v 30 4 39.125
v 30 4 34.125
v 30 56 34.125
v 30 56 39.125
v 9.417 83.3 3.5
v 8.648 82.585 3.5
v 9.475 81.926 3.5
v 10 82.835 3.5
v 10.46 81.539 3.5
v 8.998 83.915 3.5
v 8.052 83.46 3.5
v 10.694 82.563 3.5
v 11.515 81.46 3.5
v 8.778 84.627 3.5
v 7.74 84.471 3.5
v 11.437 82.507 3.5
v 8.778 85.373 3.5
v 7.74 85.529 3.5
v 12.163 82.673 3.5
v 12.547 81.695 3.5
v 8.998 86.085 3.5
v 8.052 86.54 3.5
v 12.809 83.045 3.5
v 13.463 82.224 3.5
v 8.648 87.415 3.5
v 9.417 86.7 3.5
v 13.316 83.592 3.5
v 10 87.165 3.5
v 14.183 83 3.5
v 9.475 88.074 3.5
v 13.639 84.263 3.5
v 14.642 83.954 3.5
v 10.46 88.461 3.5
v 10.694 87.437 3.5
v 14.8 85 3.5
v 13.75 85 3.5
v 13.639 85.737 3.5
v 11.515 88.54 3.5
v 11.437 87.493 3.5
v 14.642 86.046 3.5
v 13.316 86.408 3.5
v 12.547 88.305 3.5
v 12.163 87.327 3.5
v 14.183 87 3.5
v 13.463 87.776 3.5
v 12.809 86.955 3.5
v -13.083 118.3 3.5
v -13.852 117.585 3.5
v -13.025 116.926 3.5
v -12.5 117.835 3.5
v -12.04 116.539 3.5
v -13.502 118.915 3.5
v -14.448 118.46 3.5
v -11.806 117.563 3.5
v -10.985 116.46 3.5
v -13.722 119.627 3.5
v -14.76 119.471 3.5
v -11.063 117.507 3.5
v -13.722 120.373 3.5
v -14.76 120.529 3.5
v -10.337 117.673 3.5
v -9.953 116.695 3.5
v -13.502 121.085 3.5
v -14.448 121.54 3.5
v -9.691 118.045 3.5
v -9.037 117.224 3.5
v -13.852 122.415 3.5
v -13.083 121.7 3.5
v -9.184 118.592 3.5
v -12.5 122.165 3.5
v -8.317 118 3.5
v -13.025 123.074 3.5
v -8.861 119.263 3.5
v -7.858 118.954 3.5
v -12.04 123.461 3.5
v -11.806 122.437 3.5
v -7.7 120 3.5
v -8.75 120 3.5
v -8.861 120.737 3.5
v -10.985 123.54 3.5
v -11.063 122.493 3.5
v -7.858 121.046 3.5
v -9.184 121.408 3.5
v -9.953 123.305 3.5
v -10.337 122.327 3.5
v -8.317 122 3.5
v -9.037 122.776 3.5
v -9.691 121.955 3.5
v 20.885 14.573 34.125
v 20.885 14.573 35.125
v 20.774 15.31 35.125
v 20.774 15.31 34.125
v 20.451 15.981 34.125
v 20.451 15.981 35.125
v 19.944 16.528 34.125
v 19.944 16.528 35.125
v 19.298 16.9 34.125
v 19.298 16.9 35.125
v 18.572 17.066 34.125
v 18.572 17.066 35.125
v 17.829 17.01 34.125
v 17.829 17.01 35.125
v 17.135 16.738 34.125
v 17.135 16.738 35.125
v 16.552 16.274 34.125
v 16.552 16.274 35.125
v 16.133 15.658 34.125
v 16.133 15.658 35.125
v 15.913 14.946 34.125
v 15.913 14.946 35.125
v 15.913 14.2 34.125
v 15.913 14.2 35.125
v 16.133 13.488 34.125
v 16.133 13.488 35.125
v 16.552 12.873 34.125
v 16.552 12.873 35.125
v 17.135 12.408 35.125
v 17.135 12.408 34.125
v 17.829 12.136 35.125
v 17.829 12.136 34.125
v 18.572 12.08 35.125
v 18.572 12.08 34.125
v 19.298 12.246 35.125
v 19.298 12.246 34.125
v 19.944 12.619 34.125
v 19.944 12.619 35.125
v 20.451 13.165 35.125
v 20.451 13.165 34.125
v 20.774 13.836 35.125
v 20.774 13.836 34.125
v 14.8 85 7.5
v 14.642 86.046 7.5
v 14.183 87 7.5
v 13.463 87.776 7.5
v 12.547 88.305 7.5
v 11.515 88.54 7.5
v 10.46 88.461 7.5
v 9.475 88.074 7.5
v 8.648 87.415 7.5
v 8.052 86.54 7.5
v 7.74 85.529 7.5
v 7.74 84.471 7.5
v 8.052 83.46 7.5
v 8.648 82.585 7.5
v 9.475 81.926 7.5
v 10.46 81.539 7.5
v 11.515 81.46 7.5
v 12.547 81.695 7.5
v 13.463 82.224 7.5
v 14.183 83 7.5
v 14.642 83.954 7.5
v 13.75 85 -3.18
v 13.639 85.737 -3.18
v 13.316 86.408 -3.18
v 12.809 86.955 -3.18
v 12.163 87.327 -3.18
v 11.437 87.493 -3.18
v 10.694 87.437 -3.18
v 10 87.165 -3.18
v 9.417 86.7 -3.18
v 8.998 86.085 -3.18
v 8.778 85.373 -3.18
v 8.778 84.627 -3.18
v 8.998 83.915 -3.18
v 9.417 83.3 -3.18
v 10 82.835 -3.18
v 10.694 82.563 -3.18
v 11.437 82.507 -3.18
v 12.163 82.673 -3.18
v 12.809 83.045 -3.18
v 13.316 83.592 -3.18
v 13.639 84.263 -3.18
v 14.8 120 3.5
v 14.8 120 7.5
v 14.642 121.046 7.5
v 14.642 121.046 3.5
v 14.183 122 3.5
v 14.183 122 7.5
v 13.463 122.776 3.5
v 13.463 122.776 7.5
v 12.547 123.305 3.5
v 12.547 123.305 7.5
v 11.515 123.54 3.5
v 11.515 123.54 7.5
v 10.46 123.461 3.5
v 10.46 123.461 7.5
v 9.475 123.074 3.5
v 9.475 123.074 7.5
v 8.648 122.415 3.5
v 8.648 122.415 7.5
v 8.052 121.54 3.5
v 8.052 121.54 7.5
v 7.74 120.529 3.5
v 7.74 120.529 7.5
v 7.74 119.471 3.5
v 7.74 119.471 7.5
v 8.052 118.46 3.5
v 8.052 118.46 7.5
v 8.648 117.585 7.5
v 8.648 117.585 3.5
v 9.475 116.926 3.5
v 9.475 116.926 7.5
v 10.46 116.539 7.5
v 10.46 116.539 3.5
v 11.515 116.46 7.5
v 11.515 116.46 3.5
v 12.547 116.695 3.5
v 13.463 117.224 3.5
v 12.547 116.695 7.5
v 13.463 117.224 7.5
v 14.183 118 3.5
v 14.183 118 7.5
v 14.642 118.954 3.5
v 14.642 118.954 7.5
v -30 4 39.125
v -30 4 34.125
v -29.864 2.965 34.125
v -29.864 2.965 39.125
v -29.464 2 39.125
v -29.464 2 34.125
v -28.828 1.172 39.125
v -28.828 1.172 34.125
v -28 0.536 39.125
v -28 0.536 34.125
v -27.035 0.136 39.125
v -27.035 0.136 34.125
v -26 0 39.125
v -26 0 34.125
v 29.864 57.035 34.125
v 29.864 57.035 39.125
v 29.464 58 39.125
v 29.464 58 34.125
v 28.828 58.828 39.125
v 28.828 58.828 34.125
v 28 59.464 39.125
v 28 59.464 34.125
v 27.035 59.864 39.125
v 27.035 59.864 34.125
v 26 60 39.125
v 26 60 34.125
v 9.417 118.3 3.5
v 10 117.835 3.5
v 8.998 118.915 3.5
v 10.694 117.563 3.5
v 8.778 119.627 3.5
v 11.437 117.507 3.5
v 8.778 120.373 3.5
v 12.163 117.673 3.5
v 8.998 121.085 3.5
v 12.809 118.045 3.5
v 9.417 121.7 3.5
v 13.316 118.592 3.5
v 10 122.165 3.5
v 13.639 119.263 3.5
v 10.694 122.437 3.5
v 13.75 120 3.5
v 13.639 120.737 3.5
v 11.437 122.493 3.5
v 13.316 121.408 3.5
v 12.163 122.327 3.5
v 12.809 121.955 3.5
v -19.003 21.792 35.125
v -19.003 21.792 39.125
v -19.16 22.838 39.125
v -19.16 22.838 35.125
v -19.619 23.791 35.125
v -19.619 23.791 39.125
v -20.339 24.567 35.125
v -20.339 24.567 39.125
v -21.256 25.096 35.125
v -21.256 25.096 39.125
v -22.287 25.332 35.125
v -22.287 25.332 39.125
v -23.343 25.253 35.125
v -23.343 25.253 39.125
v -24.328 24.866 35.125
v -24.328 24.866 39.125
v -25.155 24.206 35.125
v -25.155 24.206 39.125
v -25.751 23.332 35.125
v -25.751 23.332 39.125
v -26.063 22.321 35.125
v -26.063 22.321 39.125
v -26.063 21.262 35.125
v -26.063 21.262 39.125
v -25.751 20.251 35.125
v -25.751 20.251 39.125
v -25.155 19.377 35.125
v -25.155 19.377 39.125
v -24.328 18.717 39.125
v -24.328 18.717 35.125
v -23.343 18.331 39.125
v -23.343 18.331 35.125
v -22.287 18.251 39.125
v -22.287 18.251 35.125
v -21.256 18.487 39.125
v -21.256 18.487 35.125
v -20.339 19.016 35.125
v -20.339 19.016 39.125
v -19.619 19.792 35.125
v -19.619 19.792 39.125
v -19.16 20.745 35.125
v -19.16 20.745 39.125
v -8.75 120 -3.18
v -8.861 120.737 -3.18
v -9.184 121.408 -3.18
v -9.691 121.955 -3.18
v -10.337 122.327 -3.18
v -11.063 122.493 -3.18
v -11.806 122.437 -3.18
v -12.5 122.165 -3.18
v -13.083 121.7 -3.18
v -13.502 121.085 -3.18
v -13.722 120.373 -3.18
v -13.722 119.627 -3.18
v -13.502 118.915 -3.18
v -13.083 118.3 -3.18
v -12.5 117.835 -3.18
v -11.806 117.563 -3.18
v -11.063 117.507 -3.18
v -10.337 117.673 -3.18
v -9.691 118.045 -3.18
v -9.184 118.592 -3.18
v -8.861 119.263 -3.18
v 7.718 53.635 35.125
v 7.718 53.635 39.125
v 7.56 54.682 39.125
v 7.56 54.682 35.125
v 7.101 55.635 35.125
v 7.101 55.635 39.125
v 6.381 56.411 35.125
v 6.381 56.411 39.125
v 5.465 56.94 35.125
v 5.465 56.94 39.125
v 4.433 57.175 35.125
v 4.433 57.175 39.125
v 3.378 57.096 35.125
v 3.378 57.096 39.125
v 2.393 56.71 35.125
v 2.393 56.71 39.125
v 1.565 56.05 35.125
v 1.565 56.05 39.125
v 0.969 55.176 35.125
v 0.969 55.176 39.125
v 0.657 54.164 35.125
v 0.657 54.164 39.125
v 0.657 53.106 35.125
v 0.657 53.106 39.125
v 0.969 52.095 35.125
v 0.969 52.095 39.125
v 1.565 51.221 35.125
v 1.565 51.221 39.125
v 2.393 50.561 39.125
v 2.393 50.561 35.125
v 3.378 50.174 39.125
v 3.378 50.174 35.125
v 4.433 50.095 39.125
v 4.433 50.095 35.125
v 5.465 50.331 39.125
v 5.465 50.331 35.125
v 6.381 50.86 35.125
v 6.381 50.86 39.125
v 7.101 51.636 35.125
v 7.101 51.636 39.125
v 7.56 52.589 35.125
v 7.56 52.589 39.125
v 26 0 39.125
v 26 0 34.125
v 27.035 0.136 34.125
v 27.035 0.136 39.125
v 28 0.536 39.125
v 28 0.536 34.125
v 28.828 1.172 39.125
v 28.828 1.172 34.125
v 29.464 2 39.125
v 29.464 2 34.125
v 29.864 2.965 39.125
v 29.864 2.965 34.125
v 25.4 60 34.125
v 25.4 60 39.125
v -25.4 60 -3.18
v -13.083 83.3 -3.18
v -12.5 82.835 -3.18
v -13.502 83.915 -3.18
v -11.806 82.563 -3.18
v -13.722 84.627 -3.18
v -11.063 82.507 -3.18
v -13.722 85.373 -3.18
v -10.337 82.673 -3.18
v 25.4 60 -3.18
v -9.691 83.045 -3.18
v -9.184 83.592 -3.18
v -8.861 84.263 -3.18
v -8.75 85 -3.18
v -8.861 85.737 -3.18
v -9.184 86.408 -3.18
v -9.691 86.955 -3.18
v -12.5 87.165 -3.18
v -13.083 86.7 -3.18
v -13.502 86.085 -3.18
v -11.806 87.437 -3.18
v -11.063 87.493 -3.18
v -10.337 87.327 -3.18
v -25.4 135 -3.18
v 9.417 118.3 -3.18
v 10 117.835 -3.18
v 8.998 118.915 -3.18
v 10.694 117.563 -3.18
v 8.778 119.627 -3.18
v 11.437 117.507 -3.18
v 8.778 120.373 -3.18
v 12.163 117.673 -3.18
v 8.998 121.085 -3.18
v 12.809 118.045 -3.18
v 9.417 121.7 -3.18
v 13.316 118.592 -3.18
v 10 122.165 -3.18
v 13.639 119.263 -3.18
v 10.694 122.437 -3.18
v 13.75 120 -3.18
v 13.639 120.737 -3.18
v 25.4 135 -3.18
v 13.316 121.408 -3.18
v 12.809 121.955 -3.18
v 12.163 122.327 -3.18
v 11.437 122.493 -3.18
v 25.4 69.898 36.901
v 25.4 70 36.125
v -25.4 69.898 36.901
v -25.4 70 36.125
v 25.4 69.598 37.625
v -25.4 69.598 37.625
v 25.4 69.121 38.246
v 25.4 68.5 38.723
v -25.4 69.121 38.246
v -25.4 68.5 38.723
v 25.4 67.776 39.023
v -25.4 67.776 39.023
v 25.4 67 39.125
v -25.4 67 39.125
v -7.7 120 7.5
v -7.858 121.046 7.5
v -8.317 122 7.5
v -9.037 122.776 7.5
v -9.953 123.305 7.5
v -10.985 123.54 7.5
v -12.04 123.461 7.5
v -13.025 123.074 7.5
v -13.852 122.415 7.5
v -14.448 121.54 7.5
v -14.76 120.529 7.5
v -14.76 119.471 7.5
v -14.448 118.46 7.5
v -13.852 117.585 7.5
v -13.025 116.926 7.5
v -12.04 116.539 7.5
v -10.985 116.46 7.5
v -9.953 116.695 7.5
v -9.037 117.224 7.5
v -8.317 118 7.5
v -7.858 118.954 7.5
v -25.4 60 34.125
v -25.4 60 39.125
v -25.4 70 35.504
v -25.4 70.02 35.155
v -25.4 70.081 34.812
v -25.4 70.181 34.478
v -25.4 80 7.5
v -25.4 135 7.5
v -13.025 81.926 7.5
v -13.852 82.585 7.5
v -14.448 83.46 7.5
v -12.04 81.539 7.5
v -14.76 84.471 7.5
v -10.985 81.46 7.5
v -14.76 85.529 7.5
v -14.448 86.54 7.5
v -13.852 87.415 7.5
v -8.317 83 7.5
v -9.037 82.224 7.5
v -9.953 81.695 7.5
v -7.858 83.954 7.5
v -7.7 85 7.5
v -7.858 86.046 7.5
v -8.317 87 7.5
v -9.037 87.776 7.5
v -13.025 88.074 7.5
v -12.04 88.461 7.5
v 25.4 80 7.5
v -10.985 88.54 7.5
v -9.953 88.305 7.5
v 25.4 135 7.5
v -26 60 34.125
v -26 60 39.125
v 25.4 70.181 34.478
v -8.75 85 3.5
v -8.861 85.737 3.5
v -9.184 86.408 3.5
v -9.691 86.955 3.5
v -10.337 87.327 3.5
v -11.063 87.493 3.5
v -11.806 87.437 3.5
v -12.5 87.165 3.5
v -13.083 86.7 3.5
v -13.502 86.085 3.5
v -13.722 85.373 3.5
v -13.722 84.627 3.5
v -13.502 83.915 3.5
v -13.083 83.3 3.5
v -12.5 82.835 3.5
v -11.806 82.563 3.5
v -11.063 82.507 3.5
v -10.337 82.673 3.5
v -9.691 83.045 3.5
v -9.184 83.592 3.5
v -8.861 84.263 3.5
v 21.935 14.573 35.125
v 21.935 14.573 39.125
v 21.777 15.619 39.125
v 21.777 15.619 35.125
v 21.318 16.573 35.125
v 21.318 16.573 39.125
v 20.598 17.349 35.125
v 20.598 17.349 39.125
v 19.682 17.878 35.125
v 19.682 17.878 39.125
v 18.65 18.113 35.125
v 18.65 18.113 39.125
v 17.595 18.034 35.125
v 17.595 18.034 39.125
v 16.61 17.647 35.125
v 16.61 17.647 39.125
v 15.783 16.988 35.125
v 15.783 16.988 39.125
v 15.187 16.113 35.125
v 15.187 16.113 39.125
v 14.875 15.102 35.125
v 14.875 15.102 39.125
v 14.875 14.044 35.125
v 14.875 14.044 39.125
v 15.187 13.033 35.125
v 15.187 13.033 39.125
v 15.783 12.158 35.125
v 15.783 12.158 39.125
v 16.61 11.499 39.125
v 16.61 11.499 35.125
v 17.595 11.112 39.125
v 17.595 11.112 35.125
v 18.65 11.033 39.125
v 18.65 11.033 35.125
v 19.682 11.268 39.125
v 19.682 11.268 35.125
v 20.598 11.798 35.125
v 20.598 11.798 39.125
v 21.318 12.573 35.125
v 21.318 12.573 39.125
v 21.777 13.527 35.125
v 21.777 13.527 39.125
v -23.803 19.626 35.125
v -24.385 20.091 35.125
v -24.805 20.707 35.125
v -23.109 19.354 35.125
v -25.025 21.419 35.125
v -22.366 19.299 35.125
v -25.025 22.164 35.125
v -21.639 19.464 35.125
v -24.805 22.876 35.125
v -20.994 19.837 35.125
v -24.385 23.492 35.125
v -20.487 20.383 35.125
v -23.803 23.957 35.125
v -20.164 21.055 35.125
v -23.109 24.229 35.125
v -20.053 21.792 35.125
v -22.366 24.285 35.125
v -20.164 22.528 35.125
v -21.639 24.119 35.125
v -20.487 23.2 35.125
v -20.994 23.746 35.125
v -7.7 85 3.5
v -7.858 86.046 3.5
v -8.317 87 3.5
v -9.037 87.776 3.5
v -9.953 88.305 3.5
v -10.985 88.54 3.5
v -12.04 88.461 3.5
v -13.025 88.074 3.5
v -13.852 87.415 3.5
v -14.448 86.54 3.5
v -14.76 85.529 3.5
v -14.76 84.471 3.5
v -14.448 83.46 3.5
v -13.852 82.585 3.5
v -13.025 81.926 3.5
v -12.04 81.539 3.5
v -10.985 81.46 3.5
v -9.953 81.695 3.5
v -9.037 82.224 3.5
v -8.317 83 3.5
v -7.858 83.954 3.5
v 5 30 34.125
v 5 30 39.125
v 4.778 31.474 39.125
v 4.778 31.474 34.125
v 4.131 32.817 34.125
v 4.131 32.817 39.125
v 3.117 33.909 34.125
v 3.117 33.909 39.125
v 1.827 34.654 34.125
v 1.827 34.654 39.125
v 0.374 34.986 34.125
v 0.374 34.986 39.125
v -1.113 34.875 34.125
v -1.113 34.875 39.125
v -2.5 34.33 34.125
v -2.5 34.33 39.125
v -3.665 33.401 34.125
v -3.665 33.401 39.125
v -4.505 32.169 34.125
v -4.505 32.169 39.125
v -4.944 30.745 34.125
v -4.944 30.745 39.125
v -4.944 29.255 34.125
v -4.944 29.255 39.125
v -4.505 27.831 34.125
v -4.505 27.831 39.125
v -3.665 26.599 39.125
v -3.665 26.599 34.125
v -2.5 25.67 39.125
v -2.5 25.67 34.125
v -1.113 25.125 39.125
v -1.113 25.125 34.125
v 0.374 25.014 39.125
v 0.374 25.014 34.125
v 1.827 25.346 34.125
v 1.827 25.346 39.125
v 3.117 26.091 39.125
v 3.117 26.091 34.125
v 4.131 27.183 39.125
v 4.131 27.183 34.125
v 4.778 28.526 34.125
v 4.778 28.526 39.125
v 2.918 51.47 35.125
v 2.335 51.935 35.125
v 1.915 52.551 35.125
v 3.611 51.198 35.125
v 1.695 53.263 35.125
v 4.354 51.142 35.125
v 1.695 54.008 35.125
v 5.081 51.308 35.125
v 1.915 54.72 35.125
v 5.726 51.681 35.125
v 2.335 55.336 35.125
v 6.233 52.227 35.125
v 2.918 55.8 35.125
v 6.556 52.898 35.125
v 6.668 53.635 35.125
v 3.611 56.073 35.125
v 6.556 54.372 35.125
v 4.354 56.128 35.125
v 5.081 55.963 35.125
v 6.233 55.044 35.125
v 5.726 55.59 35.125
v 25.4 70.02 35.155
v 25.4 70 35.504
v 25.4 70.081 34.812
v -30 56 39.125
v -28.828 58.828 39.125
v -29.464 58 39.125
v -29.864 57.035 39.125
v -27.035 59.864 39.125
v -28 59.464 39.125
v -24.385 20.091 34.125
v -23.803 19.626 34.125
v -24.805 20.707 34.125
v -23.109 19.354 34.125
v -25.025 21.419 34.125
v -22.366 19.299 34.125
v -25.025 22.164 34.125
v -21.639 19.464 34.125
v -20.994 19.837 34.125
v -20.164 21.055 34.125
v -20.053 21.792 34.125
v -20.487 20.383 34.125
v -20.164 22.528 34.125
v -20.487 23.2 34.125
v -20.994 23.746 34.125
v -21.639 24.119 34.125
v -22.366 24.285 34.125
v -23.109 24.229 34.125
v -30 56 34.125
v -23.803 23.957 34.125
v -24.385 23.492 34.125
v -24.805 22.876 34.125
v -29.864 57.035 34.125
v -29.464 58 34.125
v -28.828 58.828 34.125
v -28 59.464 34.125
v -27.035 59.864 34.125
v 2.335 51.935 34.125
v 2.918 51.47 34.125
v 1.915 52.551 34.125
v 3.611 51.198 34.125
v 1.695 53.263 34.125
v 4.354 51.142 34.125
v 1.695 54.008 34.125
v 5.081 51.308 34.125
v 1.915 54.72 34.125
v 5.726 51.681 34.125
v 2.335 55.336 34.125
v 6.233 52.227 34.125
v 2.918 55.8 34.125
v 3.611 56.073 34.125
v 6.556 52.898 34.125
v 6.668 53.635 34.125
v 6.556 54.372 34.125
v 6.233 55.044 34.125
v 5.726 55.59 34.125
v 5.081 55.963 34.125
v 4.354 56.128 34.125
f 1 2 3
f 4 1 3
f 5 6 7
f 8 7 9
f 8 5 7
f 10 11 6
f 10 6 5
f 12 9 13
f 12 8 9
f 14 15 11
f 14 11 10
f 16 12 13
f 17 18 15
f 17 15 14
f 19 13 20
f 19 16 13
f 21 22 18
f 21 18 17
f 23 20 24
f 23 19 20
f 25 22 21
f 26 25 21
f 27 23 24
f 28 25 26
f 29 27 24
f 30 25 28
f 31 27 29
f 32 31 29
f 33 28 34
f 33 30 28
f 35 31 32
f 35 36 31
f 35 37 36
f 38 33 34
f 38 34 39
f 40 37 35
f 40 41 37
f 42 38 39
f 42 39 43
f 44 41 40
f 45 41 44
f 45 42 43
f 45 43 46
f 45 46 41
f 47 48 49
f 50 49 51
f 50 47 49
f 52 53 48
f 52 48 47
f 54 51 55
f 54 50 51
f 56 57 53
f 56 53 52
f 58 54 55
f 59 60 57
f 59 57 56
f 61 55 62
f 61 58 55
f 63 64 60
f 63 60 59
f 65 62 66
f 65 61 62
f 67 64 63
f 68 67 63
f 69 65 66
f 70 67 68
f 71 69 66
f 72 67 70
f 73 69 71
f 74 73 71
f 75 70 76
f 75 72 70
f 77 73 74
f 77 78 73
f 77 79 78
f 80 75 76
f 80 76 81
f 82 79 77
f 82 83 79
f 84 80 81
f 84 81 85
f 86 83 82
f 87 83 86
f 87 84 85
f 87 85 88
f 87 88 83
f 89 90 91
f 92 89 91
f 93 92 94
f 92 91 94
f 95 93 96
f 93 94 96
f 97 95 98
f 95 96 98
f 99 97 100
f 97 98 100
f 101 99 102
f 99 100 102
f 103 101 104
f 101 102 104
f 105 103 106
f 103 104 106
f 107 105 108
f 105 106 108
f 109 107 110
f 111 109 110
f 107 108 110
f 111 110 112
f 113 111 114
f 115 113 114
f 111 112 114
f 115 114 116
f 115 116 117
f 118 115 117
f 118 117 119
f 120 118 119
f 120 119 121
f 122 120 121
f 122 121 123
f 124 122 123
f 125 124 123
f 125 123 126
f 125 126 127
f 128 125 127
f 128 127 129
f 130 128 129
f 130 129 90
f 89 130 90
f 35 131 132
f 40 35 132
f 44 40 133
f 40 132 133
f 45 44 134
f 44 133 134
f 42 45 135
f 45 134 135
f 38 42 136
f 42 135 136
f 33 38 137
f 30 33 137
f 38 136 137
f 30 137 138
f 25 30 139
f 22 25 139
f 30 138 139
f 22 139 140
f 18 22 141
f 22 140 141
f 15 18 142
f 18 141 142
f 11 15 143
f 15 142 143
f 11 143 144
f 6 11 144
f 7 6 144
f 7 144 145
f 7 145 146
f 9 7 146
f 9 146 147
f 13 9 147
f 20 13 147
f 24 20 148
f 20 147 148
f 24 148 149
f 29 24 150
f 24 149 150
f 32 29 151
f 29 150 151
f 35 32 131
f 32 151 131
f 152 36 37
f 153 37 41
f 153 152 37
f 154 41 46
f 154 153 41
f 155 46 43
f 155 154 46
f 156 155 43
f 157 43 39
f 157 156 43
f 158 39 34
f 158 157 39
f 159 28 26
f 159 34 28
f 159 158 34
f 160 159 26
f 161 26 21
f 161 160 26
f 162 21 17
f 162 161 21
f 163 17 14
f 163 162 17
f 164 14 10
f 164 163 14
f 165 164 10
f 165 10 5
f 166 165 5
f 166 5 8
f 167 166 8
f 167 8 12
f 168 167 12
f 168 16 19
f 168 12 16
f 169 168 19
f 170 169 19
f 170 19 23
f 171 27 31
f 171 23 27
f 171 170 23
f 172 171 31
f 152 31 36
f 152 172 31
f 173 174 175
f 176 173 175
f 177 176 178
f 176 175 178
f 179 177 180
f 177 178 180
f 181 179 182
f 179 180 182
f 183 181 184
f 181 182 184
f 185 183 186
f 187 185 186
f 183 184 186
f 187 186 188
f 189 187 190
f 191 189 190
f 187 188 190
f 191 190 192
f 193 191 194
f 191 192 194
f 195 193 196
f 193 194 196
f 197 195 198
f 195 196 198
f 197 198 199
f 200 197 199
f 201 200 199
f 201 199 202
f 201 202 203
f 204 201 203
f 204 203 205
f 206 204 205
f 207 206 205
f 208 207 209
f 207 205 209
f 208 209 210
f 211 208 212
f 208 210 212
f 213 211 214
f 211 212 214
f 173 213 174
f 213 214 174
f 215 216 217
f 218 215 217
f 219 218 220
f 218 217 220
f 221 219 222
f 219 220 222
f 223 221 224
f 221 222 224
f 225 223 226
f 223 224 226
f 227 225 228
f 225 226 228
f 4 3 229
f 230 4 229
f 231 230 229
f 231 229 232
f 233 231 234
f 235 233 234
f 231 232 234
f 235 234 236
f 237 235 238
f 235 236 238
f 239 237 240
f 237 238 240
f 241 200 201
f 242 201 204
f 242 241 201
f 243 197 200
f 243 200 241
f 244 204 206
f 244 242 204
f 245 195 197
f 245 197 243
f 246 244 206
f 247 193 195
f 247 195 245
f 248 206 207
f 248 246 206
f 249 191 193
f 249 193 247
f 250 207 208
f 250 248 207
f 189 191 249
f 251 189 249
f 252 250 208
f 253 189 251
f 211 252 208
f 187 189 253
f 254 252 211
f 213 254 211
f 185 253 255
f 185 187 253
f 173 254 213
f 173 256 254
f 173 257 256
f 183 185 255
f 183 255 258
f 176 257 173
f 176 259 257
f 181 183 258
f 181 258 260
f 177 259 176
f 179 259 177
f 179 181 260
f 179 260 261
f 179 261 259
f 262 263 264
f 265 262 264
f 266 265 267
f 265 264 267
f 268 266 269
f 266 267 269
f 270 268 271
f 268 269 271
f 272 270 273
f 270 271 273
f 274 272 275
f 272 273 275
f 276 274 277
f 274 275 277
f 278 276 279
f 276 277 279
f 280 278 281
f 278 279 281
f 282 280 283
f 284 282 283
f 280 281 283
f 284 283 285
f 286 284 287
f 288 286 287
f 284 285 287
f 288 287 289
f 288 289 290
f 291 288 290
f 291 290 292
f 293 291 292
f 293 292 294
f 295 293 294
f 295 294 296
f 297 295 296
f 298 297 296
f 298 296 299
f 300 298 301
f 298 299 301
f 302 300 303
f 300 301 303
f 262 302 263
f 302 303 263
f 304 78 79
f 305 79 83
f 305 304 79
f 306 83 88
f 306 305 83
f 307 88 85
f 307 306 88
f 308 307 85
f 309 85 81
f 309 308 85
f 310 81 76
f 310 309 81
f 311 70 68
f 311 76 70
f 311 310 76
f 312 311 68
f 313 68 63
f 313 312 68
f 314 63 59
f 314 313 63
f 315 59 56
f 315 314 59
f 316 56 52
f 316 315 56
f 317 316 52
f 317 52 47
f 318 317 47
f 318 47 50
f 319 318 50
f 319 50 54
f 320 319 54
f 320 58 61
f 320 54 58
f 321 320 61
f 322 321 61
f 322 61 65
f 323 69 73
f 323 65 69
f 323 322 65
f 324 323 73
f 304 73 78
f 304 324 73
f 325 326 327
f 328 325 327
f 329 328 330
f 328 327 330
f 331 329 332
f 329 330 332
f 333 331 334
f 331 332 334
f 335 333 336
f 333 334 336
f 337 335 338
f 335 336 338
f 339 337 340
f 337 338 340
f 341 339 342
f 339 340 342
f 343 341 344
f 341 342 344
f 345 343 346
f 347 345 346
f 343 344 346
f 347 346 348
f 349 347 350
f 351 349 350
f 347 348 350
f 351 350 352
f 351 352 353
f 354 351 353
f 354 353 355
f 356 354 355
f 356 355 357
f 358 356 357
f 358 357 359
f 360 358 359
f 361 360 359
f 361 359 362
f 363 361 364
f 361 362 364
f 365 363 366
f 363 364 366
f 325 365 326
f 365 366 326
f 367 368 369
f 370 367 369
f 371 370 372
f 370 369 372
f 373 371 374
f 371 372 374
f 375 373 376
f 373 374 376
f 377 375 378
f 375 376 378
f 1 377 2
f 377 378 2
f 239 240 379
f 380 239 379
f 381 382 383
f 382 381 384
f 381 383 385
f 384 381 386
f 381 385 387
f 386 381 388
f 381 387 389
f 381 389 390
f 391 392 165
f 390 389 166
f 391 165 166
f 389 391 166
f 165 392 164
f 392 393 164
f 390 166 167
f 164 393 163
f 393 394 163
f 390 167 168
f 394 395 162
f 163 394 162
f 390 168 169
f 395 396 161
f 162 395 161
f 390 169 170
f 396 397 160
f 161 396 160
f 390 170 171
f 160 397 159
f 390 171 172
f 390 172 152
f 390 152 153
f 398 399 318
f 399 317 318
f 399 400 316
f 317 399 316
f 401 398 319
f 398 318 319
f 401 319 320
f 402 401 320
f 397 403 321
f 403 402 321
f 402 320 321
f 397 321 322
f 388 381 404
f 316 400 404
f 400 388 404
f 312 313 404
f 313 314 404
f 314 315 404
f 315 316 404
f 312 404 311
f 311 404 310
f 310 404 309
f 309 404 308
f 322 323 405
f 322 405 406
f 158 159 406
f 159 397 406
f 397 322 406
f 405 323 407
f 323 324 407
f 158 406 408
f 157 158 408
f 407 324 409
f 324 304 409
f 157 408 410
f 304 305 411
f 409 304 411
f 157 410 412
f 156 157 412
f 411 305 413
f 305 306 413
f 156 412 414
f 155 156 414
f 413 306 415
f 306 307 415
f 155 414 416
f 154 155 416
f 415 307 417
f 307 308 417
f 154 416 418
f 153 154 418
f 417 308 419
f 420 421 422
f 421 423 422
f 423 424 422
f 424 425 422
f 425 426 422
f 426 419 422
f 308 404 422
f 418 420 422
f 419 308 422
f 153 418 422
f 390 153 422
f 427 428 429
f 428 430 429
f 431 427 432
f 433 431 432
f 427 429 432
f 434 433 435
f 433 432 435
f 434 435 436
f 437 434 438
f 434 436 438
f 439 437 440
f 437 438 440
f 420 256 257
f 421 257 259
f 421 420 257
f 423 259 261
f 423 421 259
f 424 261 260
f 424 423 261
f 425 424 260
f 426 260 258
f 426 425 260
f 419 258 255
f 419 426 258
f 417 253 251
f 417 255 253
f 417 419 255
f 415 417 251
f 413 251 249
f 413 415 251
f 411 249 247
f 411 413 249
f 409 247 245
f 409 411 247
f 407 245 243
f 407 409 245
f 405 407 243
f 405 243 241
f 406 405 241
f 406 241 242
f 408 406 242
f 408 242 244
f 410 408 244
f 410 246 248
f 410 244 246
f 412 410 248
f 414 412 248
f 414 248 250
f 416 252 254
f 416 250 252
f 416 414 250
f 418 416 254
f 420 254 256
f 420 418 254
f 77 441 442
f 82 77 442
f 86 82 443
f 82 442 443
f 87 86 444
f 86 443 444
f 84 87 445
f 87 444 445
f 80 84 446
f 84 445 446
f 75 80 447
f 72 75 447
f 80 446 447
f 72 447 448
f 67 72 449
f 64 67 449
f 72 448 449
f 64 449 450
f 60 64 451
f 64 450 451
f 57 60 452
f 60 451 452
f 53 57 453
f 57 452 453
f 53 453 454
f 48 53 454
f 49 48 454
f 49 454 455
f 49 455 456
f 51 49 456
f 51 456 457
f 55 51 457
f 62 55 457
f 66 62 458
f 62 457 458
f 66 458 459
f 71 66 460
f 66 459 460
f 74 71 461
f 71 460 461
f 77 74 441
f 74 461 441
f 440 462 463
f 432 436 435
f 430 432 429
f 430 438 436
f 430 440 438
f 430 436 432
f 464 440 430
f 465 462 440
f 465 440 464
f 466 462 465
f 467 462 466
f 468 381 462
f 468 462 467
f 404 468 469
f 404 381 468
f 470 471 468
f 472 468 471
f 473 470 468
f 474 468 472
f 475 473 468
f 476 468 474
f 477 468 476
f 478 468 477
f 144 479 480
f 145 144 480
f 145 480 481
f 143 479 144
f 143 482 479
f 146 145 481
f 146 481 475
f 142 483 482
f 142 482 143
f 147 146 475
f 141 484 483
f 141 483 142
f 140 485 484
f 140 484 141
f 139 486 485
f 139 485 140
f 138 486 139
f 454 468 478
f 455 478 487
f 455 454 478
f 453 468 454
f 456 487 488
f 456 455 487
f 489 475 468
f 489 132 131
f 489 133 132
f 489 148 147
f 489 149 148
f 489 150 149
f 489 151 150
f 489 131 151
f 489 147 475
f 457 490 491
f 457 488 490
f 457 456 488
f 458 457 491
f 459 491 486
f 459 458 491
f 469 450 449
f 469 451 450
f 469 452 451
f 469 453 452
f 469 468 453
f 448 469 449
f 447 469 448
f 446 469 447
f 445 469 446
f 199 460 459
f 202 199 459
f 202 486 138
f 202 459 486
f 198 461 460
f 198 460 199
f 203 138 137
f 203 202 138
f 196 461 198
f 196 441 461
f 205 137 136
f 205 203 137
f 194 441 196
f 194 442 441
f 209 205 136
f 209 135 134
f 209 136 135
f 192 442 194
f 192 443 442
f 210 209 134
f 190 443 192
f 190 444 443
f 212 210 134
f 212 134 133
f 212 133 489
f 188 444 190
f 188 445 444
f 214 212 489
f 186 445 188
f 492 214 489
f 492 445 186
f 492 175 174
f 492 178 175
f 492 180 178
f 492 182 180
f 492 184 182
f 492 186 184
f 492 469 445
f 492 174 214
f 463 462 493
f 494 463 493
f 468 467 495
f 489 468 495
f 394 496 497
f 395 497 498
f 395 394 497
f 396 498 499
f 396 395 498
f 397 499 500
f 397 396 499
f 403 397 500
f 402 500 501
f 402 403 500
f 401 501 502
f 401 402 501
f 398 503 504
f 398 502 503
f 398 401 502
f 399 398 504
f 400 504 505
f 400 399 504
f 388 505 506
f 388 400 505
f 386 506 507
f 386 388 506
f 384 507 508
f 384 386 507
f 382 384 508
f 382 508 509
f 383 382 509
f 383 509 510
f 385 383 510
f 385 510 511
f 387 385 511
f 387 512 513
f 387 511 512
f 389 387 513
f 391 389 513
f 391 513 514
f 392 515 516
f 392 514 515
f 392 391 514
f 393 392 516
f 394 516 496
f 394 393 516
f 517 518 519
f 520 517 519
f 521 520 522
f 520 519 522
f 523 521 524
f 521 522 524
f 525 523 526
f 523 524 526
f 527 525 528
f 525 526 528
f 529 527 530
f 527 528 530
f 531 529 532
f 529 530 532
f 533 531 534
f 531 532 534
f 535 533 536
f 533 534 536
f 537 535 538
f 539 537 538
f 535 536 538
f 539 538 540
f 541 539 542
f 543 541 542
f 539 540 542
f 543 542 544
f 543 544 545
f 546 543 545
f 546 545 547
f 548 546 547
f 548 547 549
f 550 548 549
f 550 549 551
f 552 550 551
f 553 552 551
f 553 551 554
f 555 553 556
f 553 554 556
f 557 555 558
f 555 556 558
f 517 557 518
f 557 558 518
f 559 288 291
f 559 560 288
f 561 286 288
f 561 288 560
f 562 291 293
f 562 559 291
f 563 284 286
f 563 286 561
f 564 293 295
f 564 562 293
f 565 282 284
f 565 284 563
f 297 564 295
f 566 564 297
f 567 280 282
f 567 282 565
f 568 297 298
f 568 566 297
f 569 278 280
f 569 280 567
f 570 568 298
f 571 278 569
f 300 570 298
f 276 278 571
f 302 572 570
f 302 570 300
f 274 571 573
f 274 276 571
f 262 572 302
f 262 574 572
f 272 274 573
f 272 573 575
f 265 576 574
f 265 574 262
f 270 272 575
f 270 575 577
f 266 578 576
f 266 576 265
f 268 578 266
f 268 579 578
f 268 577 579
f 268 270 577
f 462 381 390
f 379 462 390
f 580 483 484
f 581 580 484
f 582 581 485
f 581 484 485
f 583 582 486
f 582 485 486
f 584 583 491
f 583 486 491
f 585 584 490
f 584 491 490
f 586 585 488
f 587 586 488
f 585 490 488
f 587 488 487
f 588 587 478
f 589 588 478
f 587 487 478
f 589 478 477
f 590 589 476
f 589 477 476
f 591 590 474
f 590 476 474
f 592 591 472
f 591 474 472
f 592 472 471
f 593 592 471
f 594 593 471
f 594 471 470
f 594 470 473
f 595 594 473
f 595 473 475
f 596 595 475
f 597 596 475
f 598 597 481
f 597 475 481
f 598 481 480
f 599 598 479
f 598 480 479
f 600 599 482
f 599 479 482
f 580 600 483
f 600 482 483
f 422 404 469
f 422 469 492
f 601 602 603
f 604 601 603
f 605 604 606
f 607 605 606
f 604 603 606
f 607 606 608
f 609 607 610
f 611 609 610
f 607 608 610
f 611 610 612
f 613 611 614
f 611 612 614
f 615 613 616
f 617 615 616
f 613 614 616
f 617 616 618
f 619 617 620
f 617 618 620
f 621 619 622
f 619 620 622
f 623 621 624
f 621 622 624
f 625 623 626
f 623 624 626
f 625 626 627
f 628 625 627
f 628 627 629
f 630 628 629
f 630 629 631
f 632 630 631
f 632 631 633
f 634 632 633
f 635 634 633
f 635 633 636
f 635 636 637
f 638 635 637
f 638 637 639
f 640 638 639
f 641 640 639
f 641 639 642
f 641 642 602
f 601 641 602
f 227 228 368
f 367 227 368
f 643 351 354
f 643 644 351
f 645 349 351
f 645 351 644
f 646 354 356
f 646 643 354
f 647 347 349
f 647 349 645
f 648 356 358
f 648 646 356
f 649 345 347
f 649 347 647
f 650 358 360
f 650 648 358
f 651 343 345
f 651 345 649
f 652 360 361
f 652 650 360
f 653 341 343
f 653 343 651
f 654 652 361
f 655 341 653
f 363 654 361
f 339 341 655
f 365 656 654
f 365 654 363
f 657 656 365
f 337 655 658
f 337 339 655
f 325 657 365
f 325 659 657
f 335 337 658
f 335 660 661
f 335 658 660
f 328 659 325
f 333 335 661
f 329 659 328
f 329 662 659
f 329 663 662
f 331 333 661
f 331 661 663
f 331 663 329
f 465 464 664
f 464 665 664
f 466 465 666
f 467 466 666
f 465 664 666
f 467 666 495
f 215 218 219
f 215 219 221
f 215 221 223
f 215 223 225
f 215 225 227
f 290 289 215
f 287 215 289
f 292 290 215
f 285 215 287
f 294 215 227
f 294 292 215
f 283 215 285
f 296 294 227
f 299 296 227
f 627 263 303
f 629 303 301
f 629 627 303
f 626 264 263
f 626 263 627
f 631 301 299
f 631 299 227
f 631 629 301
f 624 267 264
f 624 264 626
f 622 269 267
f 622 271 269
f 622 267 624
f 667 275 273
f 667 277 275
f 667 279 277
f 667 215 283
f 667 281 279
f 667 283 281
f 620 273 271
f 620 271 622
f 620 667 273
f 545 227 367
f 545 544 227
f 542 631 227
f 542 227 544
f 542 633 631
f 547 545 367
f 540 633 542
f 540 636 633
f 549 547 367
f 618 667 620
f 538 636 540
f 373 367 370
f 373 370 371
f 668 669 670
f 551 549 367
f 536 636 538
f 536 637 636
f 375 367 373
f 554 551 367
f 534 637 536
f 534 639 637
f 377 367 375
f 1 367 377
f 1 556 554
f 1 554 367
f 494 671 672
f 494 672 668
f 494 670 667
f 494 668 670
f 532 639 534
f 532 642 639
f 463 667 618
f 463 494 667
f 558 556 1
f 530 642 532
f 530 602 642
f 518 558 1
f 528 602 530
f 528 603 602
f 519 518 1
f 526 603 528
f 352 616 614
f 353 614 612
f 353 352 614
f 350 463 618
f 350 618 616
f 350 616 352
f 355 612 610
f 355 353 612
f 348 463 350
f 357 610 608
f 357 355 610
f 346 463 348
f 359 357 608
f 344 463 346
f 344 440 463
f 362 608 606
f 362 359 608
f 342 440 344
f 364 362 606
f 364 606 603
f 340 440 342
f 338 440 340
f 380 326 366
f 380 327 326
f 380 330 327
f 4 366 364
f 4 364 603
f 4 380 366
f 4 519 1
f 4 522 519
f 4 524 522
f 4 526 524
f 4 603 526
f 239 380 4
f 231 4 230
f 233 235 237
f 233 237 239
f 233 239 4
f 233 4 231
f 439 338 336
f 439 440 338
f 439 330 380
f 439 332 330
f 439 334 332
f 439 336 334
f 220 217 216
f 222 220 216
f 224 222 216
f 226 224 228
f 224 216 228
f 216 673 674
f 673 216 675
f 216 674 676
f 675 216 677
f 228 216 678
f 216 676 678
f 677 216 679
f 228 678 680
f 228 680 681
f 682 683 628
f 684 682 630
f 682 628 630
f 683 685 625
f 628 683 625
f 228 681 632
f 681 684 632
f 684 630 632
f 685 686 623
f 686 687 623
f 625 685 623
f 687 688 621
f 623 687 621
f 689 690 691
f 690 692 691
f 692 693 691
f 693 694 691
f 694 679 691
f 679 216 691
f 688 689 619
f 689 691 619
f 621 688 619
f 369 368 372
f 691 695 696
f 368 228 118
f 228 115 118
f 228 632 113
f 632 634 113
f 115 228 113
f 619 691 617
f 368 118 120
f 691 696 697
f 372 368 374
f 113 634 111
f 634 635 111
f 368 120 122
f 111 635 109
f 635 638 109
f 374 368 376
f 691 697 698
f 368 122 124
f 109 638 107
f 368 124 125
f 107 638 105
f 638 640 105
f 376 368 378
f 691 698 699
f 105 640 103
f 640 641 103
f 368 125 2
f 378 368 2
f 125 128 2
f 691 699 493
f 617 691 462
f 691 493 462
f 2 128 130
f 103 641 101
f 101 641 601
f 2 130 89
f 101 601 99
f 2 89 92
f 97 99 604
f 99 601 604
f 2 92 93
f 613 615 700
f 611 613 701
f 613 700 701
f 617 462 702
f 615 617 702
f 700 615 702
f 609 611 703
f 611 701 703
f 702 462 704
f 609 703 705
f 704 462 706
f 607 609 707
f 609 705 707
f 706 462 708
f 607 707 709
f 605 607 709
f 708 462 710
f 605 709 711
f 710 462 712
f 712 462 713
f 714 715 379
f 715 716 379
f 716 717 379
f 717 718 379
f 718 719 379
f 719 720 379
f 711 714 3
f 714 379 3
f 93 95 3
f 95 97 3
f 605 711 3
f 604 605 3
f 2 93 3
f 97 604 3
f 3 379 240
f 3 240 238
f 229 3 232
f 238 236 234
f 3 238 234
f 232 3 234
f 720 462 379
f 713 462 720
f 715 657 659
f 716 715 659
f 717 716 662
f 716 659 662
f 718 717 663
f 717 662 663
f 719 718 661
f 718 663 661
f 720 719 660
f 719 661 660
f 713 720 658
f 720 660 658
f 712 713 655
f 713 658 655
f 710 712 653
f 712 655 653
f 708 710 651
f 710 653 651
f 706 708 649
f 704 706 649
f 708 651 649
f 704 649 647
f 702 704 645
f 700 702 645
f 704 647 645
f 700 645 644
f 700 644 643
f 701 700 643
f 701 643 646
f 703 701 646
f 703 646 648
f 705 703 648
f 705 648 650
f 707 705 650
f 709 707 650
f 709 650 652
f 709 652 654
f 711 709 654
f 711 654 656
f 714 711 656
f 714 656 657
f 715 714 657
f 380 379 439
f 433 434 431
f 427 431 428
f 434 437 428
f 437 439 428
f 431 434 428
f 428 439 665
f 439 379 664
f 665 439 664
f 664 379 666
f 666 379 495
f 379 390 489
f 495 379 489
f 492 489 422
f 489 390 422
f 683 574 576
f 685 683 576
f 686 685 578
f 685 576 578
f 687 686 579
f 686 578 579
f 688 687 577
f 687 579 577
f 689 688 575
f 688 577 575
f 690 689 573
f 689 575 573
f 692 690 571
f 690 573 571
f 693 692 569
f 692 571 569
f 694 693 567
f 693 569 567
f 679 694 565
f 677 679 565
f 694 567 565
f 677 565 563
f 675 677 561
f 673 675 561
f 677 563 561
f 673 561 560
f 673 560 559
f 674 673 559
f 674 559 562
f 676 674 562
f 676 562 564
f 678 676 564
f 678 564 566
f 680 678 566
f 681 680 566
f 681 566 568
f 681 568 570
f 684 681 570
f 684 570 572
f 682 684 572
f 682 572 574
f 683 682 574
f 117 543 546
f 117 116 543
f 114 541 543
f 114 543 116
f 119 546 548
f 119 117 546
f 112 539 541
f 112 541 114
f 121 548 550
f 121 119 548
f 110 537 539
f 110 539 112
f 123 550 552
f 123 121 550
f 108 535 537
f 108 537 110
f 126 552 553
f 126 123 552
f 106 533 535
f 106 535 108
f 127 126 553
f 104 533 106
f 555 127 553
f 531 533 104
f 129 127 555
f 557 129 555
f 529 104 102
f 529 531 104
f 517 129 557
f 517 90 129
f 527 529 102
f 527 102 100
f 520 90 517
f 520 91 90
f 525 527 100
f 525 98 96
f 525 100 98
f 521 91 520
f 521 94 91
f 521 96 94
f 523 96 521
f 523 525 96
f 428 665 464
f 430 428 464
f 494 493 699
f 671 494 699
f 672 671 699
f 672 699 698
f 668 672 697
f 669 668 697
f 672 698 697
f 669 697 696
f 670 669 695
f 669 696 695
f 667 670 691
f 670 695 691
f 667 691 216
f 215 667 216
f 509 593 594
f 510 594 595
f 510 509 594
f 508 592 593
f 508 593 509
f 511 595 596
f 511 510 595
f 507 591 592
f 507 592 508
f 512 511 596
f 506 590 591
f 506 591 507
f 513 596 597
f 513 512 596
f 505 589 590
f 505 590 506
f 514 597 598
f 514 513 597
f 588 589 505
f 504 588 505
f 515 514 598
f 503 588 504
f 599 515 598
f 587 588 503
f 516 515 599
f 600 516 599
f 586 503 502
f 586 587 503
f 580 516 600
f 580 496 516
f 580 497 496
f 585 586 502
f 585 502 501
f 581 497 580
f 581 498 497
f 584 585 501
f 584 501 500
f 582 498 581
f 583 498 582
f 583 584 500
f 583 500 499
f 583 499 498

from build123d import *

# Parameters (mm, degrees)
SKETCH1_W           = 50.8
SKETCH1_H           = 65.000000038
SKETCH1_R           = 2.5
EXTRUDE_5_DEPTH     = 7.5
SKETCH1_3_W         = 50.8
SKETCH1_3_H         = 10
BOSS_EXTRUDE1_DEPTH = 34.125
BOSS_EXTRUDE2_START = 34.125
BOSS_EXTRUDE2_DEPTH = 5
CHAMFER1_SIZE       = 10
CHAMFER1_SIZE2      = 27.474774195
FILLET1_R           = 3
SKETCH2_R           = 5
CUT_EXTRUDE1_DEPTH  = 144.721138443
SKETCH3_R           = 2.5
CUT_EXTRUDE2_DEPTH  = 144.721138443
SKETCH4_R           = 3.55
CUT_EXTRUDE3_DEPTH  = 4
SKETCH5_R           = 3.55
CUT_EXTRUDE4_DEPTH  = 4
BOSS_EXTRUDE3_START = -3.18
SKETCH1_5_W         = 50.8
SKETCH1_5_H         = 10
SKETCH1_5_H_2       = 65.000000038
SKETCH1_5_R         = 2.5
BOSS_EXTRUDE3_DEPTH = 3.18


with BuildPart() as part:
    # Sketch1 → 5 (new body)
    with BuildSketch(Plane.XY):
        with Locations((0, 102.500000019)):
            Rectangle(SKETCH1_W, SKETCH1_H)
        with Locations((-11.25, 85.000000038)):
            Circle(SKETCH1_R, mode=Mode.SUBTRACT)
        with Locations((-11.25, 120.000000038)):
            Circle(SKETCH1_R, mode=Mode.SUBTRACT)
        with Locations((11.25, 85.000000038)):
            Circle(SKETCH1_R, mode=Mode.SUBTRACT)
        with Locations((11.25, 120.000000038)):
            Circle(SKETCH1_R, mode=Mode.SUBTRACT)
    extrude(amount=EXTRUDE_5_DEPTH)

    # Sketch1<3> → Boss-Extrude1 (add)
    with BuildSketch(Plane.XY):
        with Locations((0, 65)):
            Rectangle(SKETCH1_3_W, SKETCH1_3_H)
    extrude(amount=BOSS_EXTRUDE1_DEPTH)

    # Sketch1<4> → Boss-Extrude2 (add)
    with BuildSketch(Plane.XY.offset(BOSS_EXTRUDE2_START)):
        with BuildLine():
            Line((-25.4, 70), (-25.4, 60))
            Line((-25.4, 60), (-26, 60))
            ThreePointArc((-26, 60), (-28.828427125, 58.828427125), (-30, 56))
            Line((-30, 56), (-30, 4))
            ThreePointArc((-30, 4), (-28.828427125, 1.171572875), (-26, 0))
            Line((-26, 0), (26, 0))
            ThreePointArc((26, 0), (28.828427125, 1.171572875), (30, 4))
            Line((30, 4), (30, 56))
            ThreePointArc((30, 56), (28.828427125, 58.828427125), (26, 60))
            Line((26, 60), (25.4, 60))
            Line((25.4, 60), (25.4, 70))
            Line((25.4, 70), (-25.4, 70))
        make_face()
    extrude(amount=BOSS_EXTRUDE2_DEPTH)

    # Chamfer1
    chamfer1_edges = [part.edges().sort_by_distance(p)[0] for p in [
        (0, 70, 7.5),
    ]]
    chamfer1_side = [part.faces().sort_by_distance(p)[0] for p in [
        (0, 102.500000019, 7.5),
    ]]
    chamfer(chamfer1_edges, length=CHAMFER1_SIZE, length2=CHAMFER1_SIZE2, reference=chamfer1_side[0])

    # Fillet1
    fillet1_edges = [part.edges().sort_by_distance(p)[0] for p in [
        (0, 70, 39.125),
        (0, 70, 34.974774195),
    ]]
    fillet(fillet1_edges, radius=FILLET1_R)

    # Sketch2 → Cut-Extrude1 (cut, through all)
    with BuildSketch(Plane.XY.offset(39.125)):
        with Locations((0, 30)):
            Circle(SKETCH2_R)
    extrude(amount=-CUT_EXTRUDE1_DEPTH, mode=Mode.SUBTRACT)

    # Sketch3 → Cut-Extrude2 (cut, through all)
    with BuildSketch(Plane.XY.offset(39.125)):
        with Locations((-22.552622899, 21.79151656)):
            Circle(SKETCH3_R)
        with Locations((4.167556264, 53.635386072)):
            Circle(SKETCH3_R)
        with Locations((18.385066635, 14.573097368)):
            Circle(SKETCH3_R)
    extrude(amount=-CUT_EXTRUDE2_DEPTH, mode=Mode.SUBTRACT)

    # Sketch4 → Cut-Extrude3 (cut)
    with BuildSketch(Plane.XY.offset(39.125)):
        with Locations((4.167556264, 53.635386072)):
            Circle(SKETCH4_R)
        with Locations((-22.552622899, 21.79151656)):
            Circle(SKETCH4_R)
        with Locations((18.385066635, 14.573097368)):
            Circle(SKETCH4_R)
    extrude(amount=-CUT_EXTRUDE3_DEPTH, mode=Mode.SUBTRACT)

    # Sketch5 → Cut-Extrude4 (cut)
    with BuildSketch(Plane.XY.offset(7.5)):
        with Locations((-11.25, 120.000000038)):
            Circle(SKETCH5_R)
        with Locations((11.25, 120.000000038)):
            Circle(SKETCH5_R)
        with Locations((-11.25, 85.000000038)):
            Circle(SKETCH5_R)
        with Locations((11.25, 85.000000038)):
            Circle(SKETCH5_R)
    extrude(amount=-CUT_EXTRUDE4_DEPTH, mode=Mode.SUBTRACT)

    # Sketch1<5> → Boss-Extrude3 (add)
    # profile 1 of 2: a face of its own
    with BuildSketch(Plane.XY.offset(BOSS_EXTRUDE3_START)):
        with Locations((0, 65)):
            Rectangle(SKETCH1_5_W, SKETCH1_5_H)
    # profile 2 of 2: a face of its own
    with BuildSketch(Plane.XY.offset(BOSS_EXTRUDE3_START)):
        with Locations((0, 102.500000019)):
            Rectangle(SKETCH1_5_W, SKETCH1_5_H_2)
        with Locations((-11.25, 85.000000038)):
            Circle(SKETCH1_5_R, mode=Mode.SUBTRACT)
        with Locations((-11.25, 120.000000038)):
            Circle(SKETCH1_5_R, mode=Mode.SUBTRACT)
        with Locations((11.25, 85.000000038)):
            Circle(SKETCH1_5_R, mode=Mode.SUBTRACT)
        with Locations((11.25, 120.000000038)):
            Circle(SKETCH1_5_R, mode=Mode.SUBTRACT)
    extrude(amount=BOSS_EXTRUDE3_DEPTH)


solid = part.part
